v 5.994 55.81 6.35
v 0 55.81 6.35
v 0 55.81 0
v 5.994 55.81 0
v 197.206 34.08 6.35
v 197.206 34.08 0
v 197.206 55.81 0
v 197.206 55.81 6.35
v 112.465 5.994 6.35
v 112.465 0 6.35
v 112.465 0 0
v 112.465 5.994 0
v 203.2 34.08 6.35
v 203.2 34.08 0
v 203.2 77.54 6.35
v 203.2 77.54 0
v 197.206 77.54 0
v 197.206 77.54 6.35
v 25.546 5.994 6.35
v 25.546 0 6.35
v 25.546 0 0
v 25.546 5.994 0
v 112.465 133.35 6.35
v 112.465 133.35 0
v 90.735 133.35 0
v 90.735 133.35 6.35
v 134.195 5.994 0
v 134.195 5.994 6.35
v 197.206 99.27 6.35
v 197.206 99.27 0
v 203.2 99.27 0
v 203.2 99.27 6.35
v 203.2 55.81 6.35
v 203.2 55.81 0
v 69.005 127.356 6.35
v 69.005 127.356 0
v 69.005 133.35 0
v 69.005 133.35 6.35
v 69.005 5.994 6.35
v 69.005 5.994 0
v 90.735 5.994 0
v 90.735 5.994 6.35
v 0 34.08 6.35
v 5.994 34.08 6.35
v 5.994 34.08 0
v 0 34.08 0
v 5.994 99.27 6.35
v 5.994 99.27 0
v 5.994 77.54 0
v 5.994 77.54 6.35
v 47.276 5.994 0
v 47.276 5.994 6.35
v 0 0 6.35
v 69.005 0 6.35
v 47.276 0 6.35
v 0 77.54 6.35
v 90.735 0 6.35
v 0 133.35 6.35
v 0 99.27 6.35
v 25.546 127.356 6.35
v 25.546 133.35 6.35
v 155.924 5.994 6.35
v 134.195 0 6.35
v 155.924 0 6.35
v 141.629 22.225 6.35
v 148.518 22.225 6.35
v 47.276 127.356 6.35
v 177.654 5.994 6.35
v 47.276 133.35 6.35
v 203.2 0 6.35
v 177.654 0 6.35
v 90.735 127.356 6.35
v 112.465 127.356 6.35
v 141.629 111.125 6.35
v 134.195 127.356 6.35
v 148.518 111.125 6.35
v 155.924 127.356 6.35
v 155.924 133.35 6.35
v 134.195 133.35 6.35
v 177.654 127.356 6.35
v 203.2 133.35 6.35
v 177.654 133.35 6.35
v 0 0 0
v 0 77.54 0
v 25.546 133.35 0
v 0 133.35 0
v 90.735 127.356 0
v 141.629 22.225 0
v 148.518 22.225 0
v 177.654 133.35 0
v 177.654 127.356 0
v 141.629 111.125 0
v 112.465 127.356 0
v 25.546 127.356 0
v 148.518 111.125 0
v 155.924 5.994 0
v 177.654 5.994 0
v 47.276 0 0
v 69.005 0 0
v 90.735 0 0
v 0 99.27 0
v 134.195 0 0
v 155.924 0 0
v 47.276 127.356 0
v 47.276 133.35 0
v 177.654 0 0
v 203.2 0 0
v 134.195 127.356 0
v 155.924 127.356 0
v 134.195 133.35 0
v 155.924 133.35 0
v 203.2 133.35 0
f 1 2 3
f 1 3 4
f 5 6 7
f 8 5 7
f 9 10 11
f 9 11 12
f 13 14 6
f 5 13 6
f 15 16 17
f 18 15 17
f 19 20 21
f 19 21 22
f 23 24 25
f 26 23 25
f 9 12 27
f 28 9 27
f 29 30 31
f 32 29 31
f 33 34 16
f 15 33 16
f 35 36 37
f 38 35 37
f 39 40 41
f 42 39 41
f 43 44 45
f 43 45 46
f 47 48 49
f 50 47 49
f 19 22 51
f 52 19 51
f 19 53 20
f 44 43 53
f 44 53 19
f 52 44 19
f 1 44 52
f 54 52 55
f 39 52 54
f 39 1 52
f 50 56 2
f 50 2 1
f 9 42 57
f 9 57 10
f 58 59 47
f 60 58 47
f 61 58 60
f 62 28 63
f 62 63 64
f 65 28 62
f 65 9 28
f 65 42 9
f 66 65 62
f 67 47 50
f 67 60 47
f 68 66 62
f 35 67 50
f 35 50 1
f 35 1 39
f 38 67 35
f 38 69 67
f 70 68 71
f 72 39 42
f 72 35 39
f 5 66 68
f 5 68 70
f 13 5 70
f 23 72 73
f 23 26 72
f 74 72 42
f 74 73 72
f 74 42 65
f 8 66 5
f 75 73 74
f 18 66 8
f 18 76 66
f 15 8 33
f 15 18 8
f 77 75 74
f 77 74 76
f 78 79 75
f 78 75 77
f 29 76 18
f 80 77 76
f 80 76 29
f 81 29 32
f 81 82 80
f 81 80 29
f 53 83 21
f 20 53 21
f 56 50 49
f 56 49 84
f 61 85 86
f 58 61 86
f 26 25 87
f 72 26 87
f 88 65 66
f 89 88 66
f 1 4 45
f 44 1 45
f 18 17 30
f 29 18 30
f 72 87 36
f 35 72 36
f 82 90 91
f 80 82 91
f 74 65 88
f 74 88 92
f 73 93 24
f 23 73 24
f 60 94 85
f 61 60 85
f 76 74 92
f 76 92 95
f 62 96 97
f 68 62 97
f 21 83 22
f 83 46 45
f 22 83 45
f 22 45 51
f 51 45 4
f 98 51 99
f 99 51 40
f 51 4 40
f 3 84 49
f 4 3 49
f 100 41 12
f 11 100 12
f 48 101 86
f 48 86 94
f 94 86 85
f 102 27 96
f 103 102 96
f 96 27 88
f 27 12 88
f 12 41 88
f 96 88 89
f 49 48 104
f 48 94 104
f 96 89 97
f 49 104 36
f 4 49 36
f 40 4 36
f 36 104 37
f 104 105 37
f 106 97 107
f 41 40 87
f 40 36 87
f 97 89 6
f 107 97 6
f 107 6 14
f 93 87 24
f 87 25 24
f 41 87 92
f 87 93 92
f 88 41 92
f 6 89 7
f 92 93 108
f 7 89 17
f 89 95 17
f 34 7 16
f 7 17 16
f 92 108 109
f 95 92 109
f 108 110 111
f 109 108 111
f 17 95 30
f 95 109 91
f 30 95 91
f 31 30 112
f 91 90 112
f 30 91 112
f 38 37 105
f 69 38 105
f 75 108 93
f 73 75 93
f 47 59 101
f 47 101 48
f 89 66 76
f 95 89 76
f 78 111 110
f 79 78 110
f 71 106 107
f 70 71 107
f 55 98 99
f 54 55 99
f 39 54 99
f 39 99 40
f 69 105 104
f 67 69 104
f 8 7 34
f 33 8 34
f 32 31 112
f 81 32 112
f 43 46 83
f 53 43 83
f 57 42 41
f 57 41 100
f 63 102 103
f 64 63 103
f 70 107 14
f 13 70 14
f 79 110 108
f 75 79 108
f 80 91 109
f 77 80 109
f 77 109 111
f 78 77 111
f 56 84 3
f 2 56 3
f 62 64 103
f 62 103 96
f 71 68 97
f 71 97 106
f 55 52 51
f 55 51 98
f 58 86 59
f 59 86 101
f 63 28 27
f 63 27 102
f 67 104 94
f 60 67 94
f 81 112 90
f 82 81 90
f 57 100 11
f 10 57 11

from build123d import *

# Parameters (mm, degrees)
BOSS_EXTRUDE1_DEPTH = 6.35
SKETCH4_W           = 6.888524177
SKETCH4_H           = 88.9
CUT_EXTRUDE1_DEPTH  = 6.35


with BuildPart() as part:
    # Sketch3 → Boss-Extrude1 (new body)
    with BuildSketch(Plane.XY):
        Polygon((0, 77.53985), (0, 55.81015), (5.9944, 55.81015), (5.9944, 34.08045), (0, 34.08045), (0, 12.35075), (0, 0), (25.54605, 0), (25.54605, 5.9944), (47.27575, 5.9944), (47.27575, 0), (69.00545, 0), (69.00545, 5.9944), (90.73515, 5.9944), (90.73515, 0), (112.46485, 0), (112.46485, 5.9944), (134.19455, 5.9944), (134.19455, 0), (155.92425, 0), (155.92425, 5.9944), (177.65395, 5.9944), (177.65395, 0), (203.2, 0), (203.2, 34.08045), (197.2056, 34.08045), (197.2056, 55.81015), (203.2, 55.81015), (203.2, 77.53985), (197.2056, 77.53985), (197.2056, 99.26955), (203.2, 99.26955), (203.2, 120.99925), (203.2, 133.35), (177.65395, 133.35), (177.65395, 127.3556), (155.92425, 127.3556), (155.92425, 133.35), (134.19455, 133.35), (134.19455, 127.3556), (112.46485, 127.3556), (112.46485, 133.35), (90.73515, 133.35), (90.73515, 127.3556), (69.00545, 127.3556), (69.00545, 133.35), (47.27575, 133.35), (47.27575, 127.3556), (25.54605, 127.3556), (25.54605, 133.35), (0, 133.35), (0, 99.26955), (5.9944, 99.26955), (5.9944, 77.53985), align=None)
    extrude(amount=BOSS_EXTRUDE1_DEPTH)

    # Sketch4 → Cut-Extrude1 (cut)
    with BuildSketch(Plane.XY.offset(6.35)):
        with Locations((145.073671488, 66.675)):
            Rectangle(SKETCH4_W, SKETCH4_H)
    extrude(amount=-CUT_EXTRUDE1_DEPTH, mode=Mode.SUBTRACT)


solid = part.part
